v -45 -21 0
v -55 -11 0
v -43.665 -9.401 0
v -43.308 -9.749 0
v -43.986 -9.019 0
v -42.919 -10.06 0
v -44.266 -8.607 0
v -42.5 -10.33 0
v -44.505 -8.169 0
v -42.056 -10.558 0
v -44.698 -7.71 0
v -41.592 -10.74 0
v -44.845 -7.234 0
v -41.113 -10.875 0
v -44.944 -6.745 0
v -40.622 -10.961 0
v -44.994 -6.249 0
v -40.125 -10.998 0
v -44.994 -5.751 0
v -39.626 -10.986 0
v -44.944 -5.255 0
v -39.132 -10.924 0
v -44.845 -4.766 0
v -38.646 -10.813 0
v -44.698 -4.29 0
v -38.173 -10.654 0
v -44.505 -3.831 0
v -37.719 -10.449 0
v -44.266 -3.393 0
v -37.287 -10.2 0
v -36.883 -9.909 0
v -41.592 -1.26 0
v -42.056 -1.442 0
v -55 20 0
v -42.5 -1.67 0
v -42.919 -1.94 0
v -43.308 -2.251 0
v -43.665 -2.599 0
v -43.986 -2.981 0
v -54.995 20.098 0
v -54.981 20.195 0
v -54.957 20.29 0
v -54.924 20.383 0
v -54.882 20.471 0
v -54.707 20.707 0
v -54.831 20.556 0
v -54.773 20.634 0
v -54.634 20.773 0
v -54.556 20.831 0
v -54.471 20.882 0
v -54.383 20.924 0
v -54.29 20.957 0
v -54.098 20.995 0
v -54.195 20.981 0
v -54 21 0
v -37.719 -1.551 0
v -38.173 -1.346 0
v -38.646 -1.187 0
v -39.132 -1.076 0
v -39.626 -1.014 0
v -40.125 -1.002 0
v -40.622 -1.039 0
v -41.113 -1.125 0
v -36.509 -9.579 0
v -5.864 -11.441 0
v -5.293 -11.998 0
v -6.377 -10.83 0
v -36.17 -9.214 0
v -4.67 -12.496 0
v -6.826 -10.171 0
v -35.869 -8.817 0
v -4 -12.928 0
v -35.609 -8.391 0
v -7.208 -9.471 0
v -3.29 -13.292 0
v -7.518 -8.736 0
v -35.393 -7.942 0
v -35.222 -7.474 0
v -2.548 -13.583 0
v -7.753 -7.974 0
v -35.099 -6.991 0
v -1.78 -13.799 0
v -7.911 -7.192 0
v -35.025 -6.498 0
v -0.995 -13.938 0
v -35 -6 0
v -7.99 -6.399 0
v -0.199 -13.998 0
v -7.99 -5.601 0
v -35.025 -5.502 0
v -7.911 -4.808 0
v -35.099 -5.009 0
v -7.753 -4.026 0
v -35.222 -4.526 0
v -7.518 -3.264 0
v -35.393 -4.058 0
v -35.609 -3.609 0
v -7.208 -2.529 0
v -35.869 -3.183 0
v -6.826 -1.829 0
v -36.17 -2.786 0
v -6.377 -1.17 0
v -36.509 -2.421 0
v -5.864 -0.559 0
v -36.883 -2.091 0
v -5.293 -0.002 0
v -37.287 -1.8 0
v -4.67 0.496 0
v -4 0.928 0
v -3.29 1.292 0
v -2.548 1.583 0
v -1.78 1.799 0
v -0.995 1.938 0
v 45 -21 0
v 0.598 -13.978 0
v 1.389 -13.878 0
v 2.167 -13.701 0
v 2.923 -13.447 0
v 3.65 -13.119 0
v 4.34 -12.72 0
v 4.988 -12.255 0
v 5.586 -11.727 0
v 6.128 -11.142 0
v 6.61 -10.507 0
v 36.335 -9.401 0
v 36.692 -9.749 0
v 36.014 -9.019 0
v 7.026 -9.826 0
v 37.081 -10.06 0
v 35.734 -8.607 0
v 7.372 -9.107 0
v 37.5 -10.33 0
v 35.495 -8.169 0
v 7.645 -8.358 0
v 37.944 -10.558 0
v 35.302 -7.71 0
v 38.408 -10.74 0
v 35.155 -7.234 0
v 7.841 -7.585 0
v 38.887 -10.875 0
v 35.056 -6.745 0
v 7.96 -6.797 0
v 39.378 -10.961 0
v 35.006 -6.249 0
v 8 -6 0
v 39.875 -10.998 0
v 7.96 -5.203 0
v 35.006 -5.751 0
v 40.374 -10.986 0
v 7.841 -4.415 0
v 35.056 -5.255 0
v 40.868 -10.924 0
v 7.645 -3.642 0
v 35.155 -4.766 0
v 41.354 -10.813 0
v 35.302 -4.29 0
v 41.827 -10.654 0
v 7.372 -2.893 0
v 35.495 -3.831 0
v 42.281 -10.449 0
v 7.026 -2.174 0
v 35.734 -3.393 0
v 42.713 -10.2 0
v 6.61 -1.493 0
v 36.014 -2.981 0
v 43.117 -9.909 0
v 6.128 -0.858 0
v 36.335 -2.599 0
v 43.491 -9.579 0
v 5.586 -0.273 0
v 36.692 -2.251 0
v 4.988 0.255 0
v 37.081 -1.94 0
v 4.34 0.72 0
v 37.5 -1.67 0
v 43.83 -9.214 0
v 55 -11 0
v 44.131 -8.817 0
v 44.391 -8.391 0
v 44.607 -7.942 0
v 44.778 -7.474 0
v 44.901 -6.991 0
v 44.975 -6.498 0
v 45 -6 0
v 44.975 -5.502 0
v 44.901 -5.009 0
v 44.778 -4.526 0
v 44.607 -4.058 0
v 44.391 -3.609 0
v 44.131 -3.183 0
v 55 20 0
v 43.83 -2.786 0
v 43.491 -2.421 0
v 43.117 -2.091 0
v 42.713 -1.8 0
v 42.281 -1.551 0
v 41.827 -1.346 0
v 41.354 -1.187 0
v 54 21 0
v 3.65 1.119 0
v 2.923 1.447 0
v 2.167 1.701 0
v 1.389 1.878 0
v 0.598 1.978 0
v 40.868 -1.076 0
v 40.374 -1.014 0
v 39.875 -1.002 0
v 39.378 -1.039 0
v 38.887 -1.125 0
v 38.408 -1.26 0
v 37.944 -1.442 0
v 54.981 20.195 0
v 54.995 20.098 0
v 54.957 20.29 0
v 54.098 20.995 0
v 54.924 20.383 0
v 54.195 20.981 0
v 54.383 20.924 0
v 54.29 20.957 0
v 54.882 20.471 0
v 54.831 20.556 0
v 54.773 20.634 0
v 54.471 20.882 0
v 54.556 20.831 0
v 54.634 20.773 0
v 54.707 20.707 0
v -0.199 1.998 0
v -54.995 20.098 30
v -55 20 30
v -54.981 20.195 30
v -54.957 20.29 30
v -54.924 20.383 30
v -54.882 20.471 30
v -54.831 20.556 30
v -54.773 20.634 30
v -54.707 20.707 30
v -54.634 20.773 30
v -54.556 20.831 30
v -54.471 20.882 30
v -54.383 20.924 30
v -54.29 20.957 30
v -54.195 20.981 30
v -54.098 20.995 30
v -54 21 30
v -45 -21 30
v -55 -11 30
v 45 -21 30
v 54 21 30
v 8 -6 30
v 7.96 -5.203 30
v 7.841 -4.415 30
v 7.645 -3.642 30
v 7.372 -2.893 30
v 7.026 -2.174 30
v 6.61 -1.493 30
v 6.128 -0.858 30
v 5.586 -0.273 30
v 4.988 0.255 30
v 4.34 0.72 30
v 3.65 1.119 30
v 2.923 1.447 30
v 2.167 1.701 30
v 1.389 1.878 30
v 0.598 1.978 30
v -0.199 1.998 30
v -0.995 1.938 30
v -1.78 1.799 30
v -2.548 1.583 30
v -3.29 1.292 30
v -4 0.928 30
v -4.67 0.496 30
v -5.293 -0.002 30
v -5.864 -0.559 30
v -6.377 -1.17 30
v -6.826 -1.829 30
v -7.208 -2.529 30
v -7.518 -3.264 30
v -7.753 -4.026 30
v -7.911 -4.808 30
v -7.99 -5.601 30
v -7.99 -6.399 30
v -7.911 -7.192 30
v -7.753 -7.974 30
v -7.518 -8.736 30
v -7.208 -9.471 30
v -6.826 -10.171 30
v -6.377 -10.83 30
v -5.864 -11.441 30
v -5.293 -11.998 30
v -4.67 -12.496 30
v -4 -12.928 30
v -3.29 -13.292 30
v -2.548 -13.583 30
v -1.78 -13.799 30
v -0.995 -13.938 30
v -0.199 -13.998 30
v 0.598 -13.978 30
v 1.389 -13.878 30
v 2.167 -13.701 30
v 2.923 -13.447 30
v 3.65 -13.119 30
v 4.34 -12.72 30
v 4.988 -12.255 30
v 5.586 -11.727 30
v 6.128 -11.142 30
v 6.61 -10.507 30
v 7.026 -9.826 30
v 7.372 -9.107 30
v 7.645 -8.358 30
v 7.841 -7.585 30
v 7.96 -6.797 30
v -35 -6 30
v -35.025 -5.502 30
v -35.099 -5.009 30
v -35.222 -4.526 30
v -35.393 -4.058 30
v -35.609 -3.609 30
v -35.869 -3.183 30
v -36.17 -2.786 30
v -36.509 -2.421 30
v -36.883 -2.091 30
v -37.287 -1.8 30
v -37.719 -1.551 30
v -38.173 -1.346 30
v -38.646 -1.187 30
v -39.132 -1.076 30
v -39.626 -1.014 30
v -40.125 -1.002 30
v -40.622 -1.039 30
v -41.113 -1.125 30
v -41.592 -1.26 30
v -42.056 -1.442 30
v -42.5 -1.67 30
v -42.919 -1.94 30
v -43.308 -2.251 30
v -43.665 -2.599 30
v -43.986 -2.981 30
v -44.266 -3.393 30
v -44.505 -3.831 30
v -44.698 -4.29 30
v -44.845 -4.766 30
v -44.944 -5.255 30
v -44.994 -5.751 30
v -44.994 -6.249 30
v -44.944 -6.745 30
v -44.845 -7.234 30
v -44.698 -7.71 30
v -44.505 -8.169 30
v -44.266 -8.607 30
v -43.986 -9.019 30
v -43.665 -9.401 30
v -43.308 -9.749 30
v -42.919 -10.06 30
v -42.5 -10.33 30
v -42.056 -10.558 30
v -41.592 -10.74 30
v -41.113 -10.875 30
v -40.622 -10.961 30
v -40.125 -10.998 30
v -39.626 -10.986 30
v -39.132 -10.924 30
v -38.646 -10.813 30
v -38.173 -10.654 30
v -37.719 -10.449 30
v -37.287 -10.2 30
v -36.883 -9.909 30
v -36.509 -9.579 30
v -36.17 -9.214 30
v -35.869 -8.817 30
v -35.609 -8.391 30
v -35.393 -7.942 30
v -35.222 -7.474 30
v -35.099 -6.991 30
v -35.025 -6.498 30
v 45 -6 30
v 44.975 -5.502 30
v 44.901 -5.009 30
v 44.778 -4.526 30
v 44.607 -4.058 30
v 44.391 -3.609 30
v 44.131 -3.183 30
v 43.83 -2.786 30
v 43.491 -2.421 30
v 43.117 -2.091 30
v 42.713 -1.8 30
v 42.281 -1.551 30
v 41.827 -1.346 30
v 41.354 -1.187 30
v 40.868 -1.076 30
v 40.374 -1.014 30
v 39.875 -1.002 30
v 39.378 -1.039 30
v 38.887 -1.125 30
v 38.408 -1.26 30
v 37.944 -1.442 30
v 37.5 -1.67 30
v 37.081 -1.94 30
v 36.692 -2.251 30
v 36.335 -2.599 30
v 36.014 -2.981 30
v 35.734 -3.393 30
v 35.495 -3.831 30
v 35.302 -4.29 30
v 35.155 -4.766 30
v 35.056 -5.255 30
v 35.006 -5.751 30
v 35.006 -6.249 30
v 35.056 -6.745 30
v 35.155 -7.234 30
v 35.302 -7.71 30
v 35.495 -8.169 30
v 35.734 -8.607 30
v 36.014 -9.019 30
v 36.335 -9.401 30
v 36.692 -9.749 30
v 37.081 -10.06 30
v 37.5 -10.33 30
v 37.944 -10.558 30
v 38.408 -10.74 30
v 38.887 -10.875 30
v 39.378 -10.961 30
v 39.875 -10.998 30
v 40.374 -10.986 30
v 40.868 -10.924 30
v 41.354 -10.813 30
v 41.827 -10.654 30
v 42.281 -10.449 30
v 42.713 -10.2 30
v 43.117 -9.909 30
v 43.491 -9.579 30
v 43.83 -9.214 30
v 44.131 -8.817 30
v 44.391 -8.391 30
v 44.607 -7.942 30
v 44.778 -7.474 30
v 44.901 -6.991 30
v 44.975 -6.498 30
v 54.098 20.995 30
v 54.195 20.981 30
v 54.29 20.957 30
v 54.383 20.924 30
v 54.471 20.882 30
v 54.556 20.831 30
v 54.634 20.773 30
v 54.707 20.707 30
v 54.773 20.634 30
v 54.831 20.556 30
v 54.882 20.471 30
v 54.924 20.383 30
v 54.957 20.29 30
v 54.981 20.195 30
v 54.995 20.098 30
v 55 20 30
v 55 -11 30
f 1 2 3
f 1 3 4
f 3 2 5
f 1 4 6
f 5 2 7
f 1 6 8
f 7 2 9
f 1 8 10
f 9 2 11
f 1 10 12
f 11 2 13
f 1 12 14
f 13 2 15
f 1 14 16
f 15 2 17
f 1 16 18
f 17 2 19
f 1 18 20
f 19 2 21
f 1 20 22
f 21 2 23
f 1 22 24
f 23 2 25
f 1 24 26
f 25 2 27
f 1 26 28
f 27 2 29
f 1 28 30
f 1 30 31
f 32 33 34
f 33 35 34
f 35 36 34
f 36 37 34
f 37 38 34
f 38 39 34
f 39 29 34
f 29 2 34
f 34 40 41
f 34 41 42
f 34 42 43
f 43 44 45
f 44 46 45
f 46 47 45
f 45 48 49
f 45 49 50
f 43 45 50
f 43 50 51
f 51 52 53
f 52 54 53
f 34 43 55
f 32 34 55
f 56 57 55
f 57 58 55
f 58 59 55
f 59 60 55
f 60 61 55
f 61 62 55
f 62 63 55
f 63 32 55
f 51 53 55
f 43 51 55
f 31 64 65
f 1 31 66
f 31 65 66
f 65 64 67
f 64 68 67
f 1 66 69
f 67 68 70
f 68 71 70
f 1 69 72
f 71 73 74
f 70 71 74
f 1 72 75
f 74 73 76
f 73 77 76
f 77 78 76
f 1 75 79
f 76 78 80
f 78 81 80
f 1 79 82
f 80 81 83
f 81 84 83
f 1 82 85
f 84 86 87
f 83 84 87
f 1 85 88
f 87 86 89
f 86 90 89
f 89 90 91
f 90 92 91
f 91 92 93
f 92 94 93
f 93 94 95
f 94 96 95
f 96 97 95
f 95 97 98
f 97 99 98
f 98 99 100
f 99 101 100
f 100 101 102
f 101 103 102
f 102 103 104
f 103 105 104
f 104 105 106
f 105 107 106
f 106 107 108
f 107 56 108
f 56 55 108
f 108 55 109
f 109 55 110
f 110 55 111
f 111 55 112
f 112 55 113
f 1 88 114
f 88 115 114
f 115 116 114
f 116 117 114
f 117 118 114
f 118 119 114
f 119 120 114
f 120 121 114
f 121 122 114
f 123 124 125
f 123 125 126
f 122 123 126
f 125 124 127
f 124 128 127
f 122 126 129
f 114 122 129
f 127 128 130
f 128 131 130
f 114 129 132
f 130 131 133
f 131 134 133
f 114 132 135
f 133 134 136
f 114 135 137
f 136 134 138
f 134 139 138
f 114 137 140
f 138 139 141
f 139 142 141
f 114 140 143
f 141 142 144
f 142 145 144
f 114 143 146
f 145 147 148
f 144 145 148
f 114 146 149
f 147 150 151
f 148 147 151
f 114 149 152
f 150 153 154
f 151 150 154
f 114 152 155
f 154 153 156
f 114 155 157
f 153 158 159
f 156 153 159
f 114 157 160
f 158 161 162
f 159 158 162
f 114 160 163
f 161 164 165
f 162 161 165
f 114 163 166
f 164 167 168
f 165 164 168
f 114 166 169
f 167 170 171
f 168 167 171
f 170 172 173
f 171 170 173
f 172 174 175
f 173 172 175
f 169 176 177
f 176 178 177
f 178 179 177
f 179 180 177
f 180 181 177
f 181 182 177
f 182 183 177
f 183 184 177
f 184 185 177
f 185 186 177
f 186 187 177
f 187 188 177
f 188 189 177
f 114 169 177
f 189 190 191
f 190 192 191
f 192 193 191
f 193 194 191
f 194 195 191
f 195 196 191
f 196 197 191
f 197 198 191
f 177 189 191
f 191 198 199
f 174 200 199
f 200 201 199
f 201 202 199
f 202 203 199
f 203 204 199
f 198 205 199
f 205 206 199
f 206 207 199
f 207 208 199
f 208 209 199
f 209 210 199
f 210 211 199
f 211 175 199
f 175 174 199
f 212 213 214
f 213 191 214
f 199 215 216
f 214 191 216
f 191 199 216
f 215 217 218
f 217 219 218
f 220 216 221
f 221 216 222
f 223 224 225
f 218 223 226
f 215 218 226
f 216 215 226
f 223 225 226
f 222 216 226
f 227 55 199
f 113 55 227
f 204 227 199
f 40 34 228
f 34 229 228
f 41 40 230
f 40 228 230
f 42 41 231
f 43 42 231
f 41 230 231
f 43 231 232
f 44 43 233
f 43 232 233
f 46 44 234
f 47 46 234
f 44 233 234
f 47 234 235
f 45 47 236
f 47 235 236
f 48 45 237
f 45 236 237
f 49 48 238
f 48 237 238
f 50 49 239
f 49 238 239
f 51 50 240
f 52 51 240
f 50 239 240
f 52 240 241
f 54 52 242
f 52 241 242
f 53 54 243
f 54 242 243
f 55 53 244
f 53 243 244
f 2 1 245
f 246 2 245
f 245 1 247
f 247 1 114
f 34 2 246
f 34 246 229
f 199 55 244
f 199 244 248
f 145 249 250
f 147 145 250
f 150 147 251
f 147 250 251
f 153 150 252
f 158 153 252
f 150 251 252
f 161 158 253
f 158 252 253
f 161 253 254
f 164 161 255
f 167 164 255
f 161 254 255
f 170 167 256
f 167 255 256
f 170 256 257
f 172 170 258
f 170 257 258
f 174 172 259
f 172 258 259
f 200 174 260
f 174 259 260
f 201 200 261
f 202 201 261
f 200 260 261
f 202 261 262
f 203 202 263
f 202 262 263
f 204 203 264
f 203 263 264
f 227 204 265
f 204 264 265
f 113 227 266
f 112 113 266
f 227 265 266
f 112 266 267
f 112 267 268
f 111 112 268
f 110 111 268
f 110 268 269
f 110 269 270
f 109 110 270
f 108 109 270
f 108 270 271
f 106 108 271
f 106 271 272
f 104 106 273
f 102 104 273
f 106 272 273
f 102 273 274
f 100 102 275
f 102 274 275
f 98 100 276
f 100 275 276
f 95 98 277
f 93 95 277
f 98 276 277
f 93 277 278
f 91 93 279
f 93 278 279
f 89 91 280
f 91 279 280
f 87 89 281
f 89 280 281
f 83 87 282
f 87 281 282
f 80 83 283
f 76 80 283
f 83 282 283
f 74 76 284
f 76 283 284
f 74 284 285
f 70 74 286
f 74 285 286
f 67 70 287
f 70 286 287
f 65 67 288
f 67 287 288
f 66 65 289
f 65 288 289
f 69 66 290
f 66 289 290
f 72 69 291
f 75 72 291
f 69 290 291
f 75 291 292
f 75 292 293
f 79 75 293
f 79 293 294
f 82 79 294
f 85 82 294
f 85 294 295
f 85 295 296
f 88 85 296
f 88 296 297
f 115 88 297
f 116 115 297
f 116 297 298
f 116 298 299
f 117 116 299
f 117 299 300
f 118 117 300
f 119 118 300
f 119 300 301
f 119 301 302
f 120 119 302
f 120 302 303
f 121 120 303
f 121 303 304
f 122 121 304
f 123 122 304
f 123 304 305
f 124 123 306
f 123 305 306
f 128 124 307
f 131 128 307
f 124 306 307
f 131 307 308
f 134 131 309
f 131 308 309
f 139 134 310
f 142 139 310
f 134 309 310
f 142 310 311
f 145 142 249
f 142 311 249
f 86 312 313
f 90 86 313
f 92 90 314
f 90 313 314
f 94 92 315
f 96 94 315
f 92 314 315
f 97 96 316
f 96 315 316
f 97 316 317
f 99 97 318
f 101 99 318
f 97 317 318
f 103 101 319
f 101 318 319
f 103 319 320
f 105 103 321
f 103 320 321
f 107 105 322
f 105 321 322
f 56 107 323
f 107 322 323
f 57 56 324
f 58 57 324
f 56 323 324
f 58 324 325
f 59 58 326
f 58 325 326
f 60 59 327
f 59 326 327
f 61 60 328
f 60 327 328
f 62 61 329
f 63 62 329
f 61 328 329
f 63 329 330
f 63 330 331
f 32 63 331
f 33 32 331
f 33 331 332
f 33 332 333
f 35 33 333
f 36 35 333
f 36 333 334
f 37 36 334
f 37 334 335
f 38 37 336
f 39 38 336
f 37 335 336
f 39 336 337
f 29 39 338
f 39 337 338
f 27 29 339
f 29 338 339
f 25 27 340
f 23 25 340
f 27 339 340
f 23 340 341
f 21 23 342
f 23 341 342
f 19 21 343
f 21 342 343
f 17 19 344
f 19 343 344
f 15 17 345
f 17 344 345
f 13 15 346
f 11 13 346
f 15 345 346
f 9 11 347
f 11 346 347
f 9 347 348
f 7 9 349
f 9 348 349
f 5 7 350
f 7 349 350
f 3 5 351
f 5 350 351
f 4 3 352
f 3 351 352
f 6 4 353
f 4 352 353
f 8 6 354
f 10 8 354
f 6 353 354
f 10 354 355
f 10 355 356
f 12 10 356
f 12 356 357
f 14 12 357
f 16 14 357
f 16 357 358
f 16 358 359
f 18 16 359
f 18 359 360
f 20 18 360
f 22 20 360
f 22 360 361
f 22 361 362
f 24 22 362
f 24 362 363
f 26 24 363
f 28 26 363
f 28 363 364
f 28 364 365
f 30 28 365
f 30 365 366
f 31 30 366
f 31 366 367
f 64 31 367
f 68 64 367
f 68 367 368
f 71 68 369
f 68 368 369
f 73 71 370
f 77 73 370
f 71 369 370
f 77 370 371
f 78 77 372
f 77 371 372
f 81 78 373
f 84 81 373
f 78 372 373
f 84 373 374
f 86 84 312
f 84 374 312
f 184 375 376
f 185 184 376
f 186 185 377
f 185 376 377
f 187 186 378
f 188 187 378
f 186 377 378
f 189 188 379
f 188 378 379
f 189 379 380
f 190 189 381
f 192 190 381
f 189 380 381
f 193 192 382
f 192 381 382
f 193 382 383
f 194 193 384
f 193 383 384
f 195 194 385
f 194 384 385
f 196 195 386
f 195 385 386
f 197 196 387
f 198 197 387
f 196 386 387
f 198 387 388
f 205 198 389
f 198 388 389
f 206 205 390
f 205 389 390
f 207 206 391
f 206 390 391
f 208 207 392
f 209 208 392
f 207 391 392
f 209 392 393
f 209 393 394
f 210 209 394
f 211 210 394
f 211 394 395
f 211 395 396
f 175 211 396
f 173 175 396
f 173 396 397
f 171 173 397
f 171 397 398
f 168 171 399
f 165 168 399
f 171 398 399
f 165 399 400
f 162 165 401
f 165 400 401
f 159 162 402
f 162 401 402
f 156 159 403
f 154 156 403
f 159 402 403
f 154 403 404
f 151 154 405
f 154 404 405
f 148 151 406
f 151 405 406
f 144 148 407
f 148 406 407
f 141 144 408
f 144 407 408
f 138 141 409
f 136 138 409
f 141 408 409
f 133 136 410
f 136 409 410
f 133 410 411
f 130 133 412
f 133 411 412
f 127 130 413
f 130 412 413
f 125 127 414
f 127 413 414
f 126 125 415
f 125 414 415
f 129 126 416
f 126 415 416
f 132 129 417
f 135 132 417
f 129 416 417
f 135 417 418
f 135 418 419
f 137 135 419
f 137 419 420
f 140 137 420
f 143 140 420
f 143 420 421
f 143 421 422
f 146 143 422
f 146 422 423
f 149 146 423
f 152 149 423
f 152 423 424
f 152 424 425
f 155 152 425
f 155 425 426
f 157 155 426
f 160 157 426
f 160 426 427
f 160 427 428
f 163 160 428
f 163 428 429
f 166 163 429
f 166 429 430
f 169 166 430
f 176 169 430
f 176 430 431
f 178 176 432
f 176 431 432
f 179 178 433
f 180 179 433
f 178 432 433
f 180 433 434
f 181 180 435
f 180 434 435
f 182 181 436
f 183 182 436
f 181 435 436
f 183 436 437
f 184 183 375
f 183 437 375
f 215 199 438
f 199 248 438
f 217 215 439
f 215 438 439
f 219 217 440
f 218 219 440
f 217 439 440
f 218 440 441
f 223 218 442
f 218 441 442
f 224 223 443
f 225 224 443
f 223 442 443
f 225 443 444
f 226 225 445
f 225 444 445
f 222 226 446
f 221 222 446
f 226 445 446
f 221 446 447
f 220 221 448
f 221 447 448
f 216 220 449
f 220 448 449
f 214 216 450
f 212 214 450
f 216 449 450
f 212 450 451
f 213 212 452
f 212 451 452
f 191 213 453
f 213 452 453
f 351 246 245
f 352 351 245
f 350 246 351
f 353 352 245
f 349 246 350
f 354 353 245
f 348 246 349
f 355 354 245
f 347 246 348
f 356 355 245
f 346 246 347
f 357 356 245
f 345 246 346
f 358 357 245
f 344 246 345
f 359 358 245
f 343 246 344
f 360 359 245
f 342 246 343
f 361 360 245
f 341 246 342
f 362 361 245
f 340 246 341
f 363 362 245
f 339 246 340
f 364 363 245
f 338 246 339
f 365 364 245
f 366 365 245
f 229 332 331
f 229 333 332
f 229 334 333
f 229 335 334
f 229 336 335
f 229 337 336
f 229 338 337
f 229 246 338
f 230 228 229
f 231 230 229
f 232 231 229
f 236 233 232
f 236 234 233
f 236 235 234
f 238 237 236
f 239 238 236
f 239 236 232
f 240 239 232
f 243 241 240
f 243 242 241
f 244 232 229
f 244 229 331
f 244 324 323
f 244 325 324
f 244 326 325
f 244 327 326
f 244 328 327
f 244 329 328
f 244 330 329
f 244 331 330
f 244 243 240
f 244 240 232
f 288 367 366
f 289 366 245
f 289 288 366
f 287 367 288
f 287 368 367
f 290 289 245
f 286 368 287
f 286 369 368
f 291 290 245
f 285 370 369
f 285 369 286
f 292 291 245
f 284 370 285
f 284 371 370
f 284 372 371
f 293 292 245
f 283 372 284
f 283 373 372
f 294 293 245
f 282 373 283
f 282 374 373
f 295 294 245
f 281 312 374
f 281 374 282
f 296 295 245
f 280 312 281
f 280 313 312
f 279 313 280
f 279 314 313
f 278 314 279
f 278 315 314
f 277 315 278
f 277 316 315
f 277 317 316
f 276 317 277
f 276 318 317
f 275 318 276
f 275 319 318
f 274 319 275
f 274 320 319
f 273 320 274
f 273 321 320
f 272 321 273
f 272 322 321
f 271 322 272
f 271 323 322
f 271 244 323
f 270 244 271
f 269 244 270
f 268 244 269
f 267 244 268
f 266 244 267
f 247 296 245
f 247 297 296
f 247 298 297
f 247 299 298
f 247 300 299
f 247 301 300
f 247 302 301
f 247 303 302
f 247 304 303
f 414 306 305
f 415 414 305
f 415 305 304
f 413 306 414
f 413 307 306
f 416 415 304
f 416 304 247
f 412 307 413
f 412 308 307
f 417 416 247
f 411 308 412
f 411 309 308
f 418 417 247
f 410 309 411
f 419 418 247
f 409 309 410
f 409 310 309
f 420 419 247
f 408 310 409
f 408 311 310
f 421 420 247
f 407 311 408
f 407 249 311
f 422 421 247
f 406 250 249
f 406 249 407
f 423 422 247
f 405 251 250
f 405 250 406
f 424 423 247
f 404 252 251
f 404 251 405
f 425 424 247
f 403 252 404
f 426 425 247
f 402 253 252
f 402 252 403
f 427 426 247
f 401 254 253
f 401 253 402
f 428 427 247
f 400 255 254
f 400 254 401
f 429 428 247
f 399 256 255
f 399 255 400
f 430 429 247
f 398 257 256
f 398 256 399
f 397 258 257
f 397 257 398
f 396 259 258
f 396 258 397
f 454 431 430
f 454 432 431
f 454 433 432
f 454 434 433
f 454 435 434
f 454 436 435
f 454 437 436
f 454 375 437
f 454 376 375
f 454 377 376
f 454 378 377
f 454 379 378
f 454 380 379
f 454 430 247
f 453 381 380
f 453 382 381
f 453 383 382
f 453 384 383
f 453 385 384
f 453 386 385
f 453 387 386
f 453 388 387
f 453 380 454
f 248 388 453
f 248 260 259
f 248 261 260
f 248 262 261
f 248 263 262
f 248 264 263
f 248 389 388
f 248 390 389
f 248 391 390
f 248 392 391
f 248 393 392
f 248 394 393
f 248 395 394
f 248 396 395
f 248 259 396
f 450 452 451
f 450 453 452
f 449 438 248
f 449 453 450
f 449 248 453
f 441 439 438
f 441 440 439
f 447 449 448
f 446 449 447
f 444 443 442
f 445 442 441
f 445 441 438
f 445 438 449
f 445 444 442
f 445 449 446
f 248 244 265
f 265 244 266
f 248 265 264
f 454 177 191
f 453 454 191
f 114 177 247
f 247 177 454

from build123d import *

# Parameters (mm, degrees)
CROQUIS1_W              = 110
CROQUIS1_H              = 42
SALIENTE_EXTRUIR1_DEPTH = 30
CHAFL_N1_SIZE           = 10
REDONDEO1_R             = 1
CROQUIS2_R              = 5
CROQUIS2_R_2            = 8
CORTAR_EXTRUIR1_DEPTH   = 30


with BuildPart() as part:
    # Croquis1 → Saliente-Extruir1 (new body)
    with BuildSketch(Plane.XY):
        Rectangle(CROQUIS1_W, CROQUIS1_H)
    extrude(amount=SALIENTE_EXTRUIR1_DEPTH)

    # Chaflán1
    chafl_n1_edges = [part.edges().sort_by_distance(p)[0] for p in [
        (55, -21, 15),
        (-55, -21, 15),
    ]]
    chamfer(chafl_n1_edges, length=CHAFL_N1_SIZE)

    # Redondeo1
    redondeo1_edges = [part.edges().sort_by_distance(p)[0] for p in [
        (-55, 21, 15),
        (55, 21, 15),
    ]]
    fillet(redondeo1_edges, radius=REDONDEO1_R)

    # Croquis2 → Cortar-Extruir1 (cut)
    with BuildSketch(Plane.XY.offset(30)):
        with Locations((-40, -6)):
            Circle(CROQUIS2_R)
        with Locations((40, -6)):
            Circle(CROQUIS2_R)
        with Locations((0, -6)):
            Circle(CROQUIS2_R_2)
    extrude(amount=-CORTAR_EXTRUIR1_DEPTH, mode=Mode.SUBTRACT)


solid = part.part
